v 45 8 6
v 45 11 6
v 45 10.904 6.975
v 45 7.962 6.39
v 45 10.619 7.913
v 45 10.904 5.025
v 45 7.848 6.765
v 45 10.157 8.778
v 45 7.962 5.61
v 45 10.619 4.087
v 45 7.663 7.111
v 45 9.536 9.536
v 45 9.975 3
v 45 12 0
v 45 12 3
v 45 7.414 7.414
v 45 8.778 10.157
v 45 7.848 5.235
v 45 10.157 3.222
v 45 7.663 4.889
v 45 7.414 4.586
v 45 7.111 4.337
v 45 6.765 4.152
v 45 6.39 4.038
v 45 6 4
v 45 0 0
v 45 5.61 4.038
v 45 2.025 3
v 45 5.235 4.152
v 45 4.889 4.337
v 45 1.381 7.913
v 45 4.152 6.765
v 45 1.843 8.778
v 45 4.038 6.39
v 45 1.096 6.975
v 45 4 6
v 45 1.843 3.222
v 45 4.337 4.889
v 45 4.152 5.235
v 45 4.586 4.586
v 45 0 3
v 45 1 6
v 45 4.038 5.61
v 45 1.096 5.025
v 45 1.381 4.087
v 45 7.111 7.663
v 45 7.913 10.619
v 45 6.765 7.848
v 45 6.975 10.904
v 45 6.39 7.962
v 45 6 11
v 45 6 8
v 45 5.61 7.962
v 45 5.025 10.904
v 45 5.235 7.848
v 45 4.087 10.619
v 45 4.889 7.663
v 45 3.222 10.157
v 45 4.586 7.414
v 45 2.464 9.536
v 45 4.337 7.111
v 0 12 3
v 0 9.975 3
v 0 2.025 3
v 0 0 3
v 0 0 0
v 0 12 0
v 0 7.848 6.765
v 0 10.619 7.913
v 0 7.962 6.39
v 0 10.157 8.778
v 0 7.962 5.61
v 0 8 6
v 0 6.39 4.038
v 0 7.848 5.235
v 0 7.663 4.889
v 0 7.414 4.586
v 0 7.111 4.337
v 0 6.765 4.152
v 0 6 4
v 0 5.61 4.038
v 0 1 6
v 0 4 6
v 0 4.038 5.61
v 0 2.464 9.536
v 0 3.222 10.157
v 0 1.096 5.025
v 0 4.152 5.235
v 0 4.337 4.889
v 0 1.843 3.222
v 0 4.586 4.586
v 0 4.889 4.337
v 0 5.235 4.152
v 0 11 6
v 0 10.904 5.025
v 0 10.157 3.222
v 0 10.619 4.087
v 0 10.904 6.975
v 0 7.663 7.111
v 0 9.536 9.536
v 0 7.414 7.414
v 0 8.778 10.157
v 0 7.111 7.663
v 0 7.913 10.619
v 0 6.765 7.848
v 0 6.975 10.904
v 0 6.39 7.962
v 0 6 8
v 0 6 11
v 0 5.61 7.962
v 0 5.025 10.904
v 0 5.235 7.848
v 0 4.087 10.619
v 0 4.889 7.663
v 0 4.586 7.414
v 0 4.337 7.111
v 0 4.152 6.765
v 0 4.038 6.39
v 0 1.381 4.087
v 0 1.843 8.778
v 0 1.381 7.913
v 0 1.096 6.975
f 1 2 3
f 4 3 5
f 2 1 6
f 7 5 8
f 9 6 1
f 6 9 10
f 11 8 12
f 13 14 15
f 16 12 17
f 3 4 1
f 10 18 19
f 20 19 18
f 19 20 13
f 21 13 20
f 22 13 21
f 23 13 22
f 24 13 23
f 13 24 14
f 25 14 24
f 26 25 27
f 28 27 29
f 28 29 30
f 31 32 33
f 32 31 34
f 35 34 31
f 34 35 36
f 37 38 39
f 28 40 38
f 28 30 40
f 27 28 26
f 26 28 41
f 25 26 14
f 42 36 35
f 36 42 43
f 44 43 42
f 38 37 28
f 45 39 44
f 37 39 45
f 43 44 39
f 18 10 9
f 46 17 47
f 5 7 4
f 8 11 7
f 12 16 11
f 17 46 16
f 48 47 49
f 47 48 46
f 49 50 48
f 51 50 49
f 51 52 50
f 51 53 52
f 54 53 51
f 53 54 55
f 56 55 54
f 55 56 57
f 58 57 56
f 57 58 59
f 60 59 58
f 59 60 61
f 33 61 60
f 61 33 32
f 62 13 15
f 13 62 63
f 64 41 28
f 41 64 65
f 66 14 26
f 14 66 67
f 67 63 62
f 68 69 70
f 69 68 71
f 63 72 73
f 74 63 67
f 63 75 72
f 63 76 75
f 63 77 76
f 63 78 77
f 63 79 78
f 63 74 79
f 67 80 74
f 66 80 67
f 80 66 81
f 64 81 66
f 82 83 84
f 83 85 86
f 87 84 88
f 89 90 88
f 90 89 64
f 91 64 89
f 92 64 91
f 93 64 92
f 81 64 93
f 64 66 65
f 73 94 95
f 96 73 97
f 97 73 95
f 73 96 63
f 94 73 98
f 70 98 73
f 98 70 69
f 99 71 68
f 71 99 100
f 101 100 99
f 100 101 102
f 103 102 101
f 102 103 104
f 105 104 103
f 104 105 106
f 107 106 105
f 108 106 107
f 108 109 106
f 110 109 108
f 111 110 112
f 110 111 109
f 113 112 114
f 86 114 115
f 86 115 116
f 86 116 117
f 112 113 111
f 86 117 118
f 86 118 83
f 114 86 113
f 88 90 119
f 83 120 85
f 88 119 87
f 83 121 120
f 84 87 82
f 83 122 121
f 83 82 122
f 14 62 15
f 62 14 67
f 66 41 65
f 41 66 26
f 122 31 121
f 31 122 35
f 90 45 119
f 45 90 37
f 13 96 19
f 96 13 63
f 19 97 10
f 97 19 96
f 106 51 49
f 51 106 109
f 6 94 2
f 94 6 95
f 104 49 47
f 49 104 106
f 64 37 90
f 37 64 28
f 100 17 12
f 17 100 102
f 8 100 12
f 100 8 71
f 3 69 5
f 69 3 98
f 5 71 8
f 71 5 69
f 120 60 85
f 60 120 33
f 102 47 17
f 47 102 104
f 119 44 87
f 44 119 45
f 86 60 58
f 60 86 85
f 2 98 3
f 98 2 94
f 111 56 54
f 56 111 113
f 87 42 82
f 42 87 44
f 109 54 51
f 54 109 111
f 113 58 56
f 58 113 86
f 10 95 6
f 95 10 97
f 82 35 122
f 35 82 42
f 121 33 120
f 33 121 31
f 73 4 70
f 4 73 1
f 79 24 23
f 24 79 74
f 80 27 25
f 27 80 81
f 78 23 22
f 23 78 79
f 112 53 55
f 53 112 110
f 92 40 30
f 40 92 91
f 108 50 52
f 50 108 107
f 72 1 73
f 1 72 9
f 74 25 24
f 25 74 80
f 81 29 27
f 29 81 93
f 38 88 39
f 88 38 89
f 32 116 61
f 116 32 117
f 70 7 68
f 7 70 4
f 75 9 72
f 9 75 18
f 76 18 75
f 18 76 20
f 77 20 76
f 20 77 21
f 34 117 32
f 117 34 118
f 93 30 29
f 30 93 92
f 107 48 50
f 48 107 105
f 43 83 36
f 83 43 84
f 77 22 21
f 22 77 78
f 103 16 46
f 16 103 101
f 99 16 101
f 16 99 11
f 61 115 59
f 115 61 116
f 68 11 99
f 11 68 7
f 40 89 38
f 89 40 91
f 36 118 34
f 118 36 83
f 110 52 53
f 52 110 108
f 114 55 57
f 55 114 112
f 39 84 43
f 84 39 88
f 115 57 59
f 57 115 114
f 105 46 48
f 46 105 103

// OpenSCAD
// Concept only. Provisional dimensions in mm.
$fn=32;
difference(){union(){cube([45,12,3]);translate([0,6,6])rotate([0,90,0])cylinder(h=45,r=5);}translate([-1,6,6])rotate([0,90,0])cylinder(h=47,r=2);}
